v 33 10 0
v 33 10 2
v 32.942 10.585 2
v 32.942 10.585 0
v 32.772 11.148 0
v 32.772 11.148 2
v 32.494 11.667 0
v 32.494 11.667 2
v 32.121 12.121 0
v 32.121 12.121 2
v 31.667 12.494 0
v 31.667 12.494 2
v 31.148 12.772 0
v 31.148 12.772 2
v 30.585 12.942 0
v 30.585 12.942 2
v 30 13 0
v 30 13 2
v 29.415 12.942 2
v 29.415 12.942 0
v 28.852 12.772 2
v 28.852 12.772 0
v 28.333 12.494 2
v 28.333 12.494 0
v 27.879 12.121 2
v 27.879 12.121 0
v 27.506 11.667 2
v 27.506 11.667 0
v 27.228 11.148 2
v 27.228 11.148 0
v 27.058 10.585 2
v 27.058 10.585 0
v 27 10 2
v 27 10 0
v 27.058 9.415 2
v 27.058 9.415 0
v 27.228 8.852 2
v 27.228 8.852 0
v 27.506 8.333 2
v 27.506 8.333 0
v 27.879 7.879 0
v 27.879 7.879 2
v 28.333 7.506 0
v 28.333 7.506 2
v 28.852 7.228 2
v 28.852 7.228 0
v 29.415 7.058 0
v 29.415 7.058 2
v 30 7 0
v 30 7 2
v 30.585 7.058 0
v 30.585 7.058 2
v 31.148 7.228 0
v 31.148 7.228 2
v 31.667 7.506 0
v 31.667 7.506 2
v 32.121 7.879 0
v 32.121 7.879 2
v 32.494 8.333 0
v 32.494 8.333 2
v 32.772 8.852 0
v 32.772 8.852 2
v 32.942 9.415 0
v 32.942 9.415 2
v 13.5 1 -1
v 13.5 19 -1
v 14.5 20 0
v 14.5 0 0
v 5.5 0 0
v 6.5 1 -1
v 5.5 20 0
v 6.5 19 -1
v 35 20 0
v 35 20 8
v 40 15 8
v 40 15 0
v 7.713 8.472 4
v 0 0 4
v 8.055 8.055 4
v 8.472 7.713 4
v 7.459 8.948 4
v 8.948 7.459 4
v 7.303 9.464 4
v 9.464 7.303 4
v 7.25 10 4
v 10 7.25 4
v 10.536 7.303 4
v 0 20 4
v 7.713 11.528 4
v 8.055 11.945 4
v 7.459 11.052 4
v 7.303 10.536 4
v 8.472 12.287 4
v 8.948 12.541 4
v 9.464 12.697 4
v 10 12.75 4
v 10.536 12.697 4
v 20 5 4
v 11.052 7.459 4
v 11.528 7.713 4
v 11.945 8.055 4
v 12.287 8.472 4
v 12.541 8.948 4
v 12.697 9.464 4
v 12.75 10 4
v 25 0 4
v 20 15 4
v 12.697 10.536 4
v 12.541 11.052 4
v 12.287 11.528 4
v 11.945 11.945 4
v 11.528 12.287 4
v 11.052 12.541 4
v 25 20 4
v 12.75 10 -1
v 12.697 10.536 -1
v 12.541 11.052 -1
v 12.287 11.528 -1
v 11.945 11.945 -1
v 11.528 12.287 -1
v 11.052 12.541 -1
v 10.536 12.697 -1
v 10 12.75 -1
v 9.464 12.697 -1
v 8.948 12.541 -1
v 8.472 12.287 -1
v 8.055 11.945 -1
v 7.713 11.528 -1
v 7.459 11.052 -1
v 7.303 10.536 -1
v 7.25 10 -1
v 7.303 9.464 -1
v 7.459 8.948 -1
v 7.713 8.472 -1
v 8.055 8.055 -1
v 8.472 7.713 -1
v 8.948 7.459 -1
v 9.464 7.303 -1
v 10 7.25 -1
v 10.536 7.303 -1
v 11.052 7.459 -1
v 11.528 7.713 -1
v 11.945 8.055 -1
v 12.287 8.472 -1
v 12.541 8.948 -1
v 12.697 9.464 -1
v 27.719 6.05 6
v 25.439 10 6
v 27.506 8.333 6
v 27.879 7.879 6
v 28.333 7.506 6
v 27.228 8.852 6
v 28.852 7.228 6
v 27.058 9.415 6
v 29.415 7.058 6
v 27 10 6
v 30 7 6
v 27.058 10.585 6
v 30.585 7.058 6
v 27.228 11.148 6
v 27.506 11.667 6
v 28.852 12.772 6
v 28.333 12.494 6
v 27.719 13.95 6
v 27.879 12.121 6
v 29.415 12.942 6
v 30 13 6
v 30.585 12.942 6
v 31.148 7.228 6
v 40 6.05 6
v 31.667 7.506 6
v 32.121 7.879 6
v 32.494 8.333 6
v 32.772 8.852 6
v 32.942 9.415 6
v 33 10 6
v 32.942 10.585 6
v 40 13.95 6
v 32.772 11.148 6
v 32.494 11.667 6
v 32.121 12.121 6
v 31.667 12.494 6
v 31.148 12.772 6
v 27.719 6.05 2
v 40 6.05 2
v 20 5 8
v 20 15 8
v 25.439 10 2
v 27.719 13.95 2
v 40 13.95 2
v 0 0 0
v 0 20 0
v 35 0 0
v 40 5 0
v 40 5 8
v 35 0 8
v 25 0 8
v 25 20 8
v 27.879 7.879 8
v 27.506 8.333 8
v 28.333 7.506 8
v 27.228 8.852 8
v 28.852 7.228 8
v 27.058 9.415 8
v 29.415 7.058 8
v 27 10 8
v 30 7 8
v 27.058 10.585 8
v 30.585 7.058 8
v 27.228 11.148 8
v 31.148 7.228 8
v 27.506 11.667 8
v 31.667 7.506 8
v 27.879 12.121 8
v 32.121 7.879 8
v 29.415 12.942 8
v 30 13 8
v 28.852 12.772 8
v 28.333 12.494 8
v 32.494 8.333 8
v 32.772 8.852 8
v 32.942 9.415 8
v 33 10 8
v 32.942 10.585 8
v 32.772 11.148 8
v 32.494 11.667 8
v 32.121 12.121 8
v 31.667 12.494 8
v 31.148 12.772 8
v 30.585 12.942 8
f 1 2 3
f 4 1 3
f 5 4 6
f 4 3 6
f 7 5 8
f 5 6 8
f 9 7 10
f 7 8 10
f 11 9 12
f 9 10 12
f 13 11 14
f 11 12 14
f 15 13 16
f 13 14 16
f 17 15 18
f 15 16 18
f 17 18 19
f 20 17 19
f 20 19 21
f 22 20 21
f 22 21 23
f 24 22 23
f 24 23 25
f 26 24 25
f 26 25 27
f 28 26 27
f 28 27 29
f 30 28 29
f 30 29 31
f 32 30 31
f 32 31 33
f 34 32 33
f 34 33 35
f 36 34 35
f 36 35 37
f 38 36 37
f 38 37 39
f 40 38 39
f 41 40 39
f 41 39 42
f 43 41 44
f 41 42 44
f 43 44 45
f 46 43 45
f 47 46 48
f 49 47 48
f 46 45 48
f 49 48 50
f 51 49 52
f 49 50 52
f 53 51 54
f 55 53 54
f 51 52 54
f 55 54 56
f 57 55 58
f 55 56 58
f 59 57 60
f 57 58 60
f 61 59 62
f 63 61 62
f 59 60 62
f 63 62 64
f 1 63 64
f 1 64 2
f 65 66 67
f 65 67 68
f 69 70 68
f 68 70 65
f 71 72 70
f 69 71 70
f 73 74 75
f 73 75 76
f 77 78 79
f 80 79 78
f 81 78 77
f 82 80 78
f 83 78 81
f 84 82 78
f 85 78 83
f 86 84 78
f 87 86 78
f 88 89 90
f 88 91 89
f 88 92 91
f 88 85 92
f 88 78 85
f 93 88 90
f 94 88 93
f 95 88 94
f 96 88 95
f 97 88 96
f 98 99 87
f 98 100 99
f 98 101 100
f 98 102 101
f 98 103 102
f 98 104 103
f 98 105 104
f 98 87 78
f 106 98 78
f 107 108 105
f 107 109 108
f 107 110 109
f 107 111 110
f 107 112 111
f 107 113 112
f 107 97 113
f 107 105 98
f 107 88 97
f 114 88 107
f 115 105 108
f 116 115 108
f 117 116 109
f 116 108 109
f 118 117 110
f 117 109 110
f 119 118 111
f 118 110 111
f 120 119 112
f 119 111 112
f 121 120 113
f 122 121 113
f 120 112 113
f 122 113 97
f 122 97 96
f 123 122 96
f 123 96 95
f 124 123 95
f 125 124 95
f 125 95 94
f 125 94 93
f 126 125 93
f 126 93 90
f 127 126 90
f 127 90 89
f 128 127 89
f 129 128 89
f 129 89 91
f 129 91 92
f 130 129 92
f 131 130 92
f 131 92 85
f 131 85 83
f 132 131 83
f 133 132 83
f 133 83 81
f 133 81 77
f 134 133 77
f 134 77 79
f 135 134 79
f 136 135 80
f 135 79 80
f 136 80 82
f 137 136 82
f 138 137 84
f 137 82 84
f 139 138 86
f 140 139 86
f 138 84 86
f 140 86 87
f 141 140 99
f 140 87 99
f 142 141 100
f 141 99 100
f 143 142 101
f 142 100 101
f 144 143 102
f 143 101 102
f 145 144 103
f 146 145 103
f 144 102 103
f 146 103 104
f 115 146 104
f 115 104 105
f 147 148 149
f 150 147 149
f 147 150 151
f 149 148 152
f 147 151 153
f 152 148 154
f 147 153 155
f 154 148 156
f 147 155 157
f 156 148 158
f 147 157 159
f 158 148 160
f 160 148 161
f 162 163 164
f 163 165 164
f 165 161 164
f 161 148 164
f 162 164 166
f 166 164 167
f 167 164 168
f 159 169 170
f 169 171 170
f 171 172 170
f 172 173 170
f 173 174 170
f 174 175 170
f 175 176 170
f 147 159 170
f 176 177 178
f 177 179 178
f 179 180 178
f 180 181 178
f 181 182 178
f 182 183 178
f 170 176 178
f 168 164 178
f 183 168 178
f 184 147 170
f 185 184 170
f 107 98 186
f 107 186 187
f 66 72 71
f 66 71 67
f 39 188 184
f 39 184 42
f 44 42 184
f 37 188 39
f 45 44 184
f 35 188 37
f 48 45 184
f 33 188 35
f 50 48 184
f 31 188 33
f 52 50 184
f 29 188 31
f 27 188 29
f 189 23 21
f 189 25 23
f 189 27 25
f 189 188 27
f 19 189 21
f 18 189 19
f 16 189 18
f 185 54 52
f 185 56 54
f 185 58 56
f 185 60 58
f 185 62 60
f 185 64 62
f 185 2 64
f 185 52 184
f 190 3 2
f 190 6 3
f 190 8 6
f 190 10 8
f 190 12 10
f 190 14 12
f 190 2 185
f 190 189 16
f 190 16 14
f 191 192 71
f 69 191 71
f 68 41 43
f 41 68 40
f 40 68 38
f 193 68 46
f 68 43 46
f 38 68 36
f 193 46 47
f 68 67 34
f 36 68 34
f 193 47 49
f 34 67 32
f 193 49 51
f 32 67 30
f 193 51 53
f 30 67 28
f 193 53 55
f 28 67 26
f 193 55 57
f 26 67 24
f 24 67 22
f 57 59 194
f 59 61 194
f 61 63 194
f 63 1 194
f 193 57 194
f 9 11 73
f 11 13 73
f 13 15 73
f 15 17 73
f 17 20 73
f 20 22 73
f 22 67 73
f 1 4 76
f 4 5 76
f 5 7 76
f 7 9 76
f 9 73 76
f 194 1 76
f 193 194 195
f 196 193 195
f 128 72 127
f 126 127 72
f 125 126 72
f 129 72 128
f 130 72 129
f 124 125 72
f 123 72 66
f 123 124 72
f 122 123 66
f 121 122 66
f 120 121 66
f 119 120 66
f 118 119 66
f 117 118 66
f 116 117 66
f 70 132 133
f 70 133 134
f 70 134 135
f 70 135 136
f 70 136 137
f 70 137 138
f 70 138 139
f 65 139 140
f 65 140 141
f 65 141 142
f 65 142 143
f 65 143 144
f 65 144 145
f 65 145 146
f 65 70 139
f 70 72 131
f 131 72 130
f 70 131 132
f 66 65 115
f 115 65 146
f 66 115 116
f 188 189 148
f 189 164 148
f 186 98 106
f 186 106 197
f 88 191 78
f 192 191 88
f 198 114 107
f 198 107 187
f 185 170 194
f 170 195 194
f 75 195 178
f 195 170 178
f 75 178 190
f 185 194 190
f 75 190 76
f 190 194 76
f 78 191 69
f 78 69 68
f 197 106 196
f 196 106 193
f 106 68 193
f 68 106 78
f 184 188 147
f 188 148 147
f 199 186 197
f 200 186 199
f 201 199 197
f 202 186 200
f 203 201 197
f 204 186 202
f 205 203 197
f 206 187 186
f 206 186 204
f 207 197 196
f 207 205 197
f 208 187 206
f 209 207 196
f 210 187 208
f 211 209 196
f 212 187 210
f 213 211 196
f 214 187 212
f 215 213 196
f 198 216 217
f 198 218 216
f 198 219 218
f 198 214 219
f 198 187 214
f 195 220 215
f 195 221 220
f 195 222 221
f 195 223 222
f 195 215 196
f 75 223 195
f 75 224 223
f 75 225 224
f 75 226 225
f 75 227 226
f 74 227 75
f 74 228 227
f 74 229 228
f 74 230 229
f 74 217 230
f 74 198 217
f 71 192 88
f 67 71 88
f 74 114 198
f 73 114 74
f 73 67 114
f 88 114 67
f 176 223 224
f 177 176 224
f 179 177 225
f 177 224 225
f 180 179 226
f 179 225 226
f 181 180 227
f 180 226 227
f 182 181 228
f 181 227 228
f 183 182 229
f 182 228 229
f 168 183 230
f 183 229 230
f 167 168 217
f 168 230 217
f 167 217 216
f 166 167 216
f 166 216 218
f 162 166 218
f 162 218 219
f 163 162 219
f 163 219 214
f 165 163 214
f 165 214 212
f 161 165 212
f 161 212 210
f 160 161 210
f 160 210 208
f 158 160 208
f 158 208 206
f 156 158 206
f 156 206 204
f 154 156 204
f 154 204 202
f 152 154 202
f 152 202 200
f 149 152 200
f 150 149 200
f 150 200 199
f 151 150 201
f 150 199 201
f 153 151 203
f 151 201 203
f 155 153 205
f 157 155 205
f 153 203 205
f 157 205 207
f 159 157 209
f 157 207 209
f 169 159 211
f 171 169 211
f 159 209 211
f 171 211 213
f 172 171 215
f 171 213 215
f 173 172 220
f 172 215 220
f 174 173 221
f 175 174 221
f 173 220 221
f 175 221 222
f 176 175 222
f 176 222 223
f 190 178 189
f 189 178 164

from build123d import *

# Parameters (mm, degrees)
F0_W      = 40
F0_H      = 20
F1_DEPTH  = 4
F2_W      = 20
F2_H      = 20
F3_DEPTH  = 4
F4_W      = 9
F4_H      = 20
F5_DEPTH  = 1
F6_SIZE   = 0.99999
F7_R      = 2.75
F8_DEPTH  = 5.001
F9_SIZE   = 5
F10_R     = 3
F11_DEPTH = 9.001
F13_DEPTH = 2


# Not quite as in the source:
# - a fillet or chamfer is up to 0.001 mm smaller than in the source, because OpenCascade refuses the exact size


with BuildPart() as f1:
    # F0 (on Top) → F1 (new body)
    with BuildSketch(Plane.XY):
        with Locations((20, 10)):
            Rectangle(F0_W, F0_H)
    extrude(amount=F1_DEPTH)

    # F2 (on face) → F3 (join)
    with BuildSketch(Plane.XY.offset(4)):
        with Locations((30, 10)):
            Rectangle(F2_W, F2_H)
    extrude(amount=F3_DEPTH)

    # F4 (on face) → F5 (join)
    with BuildSketch(Plane(origin=(0, 0, 0), x_dir=(1, 0, 0), z_dir=(0, 0, -1))):
        with Locations((10, -10)):
            Rectangle(F4_W, F4_H)
    extrude(amount=F5_DEPTH)

    # F6 (size 1 in the source; OpenCascade refuses exactly that, so slightly less here)
    f6_edges = [f1.edges().sort_by_distance(p)[0] for p in [
        (10, 0, -1),
        (5.5, 10, -1),
        (10, 20, -1),
        (14.5, 10, -1),
    ]]
    chamfer(f6_edges, length=F6_SIZE)

    # F7 (on face) → F8 (cut, through all)
    with BuildSketch(Plane.XY.offset(4)):
        with Locations((10, 10)):
            Circle(F7_R)
    extrude(amount=-F8_DEPTH, mode=Mode.SUBTRACT)

    # F9
    f9_edges = [f1.edges().sort_by_distance(p)[0] for p in [
        (40, 0, 4),
        (40, 20, 4),
        (20, 0, 6),
        (20, 20, 6),
    ]]
    chamfer(f9_edges, length=F9_SIZE)

    # F10 (on face) → F11 (cut, through all)
    with BuildSketch(Plane.XY.offset(8)):
        with Locations((30, 10)):
            Circle(F10_R)
    extrude(amount=-F11_DEPTH, mode=Mode.SUBTRACT)

    # F12 (on face) → F13 (cut, symmetric)
    with BuildSketch(Plane.XY.offset(4)):
        Polygon((25.4389328734, 10), (27.7194664367, 6.05), (40, 6.05), (40, 13.95), (27.7194664367, 13.95), align=None)
    extrude(amount=F13_DEPTH, both=True, mode=Mode.SUBTRACT)


solid = f1.part
